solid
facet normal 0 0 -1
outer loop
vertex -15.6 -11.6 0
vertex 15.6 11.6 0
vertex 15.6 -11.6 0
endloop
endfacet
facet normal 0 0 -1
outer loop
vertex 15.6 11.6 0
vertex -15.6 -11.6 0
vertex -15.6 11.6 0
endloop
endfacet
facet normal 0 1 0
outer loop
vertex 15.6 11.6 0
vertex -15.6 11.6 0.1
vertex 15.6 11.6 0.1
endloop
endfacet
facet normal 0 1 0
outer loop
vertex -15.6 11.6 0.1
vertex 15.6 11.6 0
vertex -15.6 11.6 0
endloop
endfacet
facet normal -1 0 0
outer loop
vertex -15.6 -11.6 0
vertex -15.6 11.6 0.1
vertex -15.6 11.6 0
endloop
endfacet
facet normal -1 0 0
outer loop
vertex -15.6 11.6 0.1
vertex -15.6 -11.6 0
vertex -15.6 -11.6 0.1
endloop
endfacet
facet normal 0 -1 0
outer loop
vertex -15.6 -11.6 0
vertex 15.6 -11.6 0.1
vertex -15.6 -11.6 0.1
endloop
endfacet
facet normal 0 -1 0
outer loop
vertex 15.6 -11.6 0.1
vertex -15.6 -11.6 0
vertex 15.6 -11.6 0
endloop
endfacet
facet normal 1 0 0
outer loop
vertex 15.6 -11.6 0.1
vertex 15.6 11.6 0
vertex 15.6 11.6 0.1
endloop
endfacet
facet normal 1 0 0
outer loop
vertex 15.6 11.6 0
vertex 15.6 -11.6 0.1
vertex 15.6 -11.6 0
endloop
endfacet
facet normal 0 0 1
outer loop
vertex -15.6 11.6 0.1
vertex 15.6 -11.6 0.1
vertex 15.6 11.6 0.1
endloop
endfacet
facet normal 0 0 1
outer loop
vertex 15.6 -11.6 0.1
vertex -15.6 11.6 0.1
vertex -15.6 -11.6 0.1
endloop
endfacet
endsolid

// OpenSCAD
// file: ../p/box5-12.scad
use <../lib.scad>
function ldraw_lib__box5_12() = [
// 0 Box with 5 Faces without Any Edges
// 0 Name: box5-12.dat
// 0 Author: Chris Dee [cwdee]
// 0 !LDRAW_ORG Primitive UPDATE 2009-02
// 0 !LICENSE Licensed under CC BY 4.0 : see CAreadme.txt
// 
// 0 BFC CERTIFY CCW
  [0,"BFC","CERTIFY"],
  [0,"BFC","CCW"],
// 
// 0 !HISTORY 2009-09-03 [PTadmin] Official Update 2009-02
// 
// 
// 4 16 1 1 1 1 1 -1 -1 1 -1 -1 1 1
  [4,16,1,1,1,1,1,-1,-1,1,-1,-1,1,1],
// 4 16 -1 0 1 1 0 1 1 1 1 -1 1 1
  [4,16,-1,0,1,1,0,1,1,1,1,-1,1,1],
// 4 16 -1 0 -1 -1 0 1 -1 1 1 -1 1 -1
  [4,16,-1,0,-1,-1,0,1,-1,1,1,-1,1,-1],
// 4 16 1 0 -1 -1 0 -1 -1 1 -1 1 1 -1
  [4,16,1,0,-1,-1,0,-1,-1,1,-1,1,1,-1],
// 4 16 1 0 1 1 0 -1 1 1 -1 1 1 1
  [4,16,1,0,1,1,0,-1,1,1,-1,1,1,1],
// 0
];
module ldraw_lib__box5_12(step=0, col=false, unit=2/5, alt=false, line=0.2, solid=!$preview)
    makepoly(ldraw_lib__box5_12(), step=step, col=col, unit=unit, alt=alt, line=line, solid=solid);
ldraw_lib__box5_12(line=0.2);
// main file
use <../lib.scad>
use <../p/box5-12.scad>
function ldraw_lib__4620858f() = [
// 0 Sticker  2.9 x  3.9 with Chrome Silver Mirror
// 0 Name: 4620858f.dat
// 0 Author: Takeshi Takahashi [RainbowDolphin]
// 0 !LDRAW_ORG Part UPDATE 2024-05
// 0 !LICENSE Licensed under CC BY 4.0 : see CAreadme.txt
// 
// 0 BFC CERTIFY CCW
  [0,"BFC","CERTIFY"],
  [0,"BFC","CCW"],
// 
// 0 !KEYWORDS Beauty Shop, Cosmetics, set 3187
// 
// 0 !HISTORY 2024-06-30 [OrionP] Official Update 2024-05
// 
// 
// 1 16 0 -0.25 0 39 0 0 0 0.25 0 0 0 29 box5-12.dat
  [1,16,0,-0.25,0,39,0,0,0,0.25,0,0,0,29, ldraw_lib__box5_12()],
// 
// 4 383 39 -0.25 29 -39 -0.25 29 -39 -0.25 -29 39 -0.25 -29
  [4,383,39,-0.25,29,-39,-0.25,29,-39,-0.25,-29,39,-0.25,-29],
];
module ldraw_lib__4620858f(step=0, col=false, unit=2/5, alt=false, line=0.2, solid=!$preview)
    makepoly(ldraw_lib__4620858f(), step=step, col=col, unit=unit, alt=alt, line=line, solid=solid);
ldraw_lib__4620858f(line=0.2);
